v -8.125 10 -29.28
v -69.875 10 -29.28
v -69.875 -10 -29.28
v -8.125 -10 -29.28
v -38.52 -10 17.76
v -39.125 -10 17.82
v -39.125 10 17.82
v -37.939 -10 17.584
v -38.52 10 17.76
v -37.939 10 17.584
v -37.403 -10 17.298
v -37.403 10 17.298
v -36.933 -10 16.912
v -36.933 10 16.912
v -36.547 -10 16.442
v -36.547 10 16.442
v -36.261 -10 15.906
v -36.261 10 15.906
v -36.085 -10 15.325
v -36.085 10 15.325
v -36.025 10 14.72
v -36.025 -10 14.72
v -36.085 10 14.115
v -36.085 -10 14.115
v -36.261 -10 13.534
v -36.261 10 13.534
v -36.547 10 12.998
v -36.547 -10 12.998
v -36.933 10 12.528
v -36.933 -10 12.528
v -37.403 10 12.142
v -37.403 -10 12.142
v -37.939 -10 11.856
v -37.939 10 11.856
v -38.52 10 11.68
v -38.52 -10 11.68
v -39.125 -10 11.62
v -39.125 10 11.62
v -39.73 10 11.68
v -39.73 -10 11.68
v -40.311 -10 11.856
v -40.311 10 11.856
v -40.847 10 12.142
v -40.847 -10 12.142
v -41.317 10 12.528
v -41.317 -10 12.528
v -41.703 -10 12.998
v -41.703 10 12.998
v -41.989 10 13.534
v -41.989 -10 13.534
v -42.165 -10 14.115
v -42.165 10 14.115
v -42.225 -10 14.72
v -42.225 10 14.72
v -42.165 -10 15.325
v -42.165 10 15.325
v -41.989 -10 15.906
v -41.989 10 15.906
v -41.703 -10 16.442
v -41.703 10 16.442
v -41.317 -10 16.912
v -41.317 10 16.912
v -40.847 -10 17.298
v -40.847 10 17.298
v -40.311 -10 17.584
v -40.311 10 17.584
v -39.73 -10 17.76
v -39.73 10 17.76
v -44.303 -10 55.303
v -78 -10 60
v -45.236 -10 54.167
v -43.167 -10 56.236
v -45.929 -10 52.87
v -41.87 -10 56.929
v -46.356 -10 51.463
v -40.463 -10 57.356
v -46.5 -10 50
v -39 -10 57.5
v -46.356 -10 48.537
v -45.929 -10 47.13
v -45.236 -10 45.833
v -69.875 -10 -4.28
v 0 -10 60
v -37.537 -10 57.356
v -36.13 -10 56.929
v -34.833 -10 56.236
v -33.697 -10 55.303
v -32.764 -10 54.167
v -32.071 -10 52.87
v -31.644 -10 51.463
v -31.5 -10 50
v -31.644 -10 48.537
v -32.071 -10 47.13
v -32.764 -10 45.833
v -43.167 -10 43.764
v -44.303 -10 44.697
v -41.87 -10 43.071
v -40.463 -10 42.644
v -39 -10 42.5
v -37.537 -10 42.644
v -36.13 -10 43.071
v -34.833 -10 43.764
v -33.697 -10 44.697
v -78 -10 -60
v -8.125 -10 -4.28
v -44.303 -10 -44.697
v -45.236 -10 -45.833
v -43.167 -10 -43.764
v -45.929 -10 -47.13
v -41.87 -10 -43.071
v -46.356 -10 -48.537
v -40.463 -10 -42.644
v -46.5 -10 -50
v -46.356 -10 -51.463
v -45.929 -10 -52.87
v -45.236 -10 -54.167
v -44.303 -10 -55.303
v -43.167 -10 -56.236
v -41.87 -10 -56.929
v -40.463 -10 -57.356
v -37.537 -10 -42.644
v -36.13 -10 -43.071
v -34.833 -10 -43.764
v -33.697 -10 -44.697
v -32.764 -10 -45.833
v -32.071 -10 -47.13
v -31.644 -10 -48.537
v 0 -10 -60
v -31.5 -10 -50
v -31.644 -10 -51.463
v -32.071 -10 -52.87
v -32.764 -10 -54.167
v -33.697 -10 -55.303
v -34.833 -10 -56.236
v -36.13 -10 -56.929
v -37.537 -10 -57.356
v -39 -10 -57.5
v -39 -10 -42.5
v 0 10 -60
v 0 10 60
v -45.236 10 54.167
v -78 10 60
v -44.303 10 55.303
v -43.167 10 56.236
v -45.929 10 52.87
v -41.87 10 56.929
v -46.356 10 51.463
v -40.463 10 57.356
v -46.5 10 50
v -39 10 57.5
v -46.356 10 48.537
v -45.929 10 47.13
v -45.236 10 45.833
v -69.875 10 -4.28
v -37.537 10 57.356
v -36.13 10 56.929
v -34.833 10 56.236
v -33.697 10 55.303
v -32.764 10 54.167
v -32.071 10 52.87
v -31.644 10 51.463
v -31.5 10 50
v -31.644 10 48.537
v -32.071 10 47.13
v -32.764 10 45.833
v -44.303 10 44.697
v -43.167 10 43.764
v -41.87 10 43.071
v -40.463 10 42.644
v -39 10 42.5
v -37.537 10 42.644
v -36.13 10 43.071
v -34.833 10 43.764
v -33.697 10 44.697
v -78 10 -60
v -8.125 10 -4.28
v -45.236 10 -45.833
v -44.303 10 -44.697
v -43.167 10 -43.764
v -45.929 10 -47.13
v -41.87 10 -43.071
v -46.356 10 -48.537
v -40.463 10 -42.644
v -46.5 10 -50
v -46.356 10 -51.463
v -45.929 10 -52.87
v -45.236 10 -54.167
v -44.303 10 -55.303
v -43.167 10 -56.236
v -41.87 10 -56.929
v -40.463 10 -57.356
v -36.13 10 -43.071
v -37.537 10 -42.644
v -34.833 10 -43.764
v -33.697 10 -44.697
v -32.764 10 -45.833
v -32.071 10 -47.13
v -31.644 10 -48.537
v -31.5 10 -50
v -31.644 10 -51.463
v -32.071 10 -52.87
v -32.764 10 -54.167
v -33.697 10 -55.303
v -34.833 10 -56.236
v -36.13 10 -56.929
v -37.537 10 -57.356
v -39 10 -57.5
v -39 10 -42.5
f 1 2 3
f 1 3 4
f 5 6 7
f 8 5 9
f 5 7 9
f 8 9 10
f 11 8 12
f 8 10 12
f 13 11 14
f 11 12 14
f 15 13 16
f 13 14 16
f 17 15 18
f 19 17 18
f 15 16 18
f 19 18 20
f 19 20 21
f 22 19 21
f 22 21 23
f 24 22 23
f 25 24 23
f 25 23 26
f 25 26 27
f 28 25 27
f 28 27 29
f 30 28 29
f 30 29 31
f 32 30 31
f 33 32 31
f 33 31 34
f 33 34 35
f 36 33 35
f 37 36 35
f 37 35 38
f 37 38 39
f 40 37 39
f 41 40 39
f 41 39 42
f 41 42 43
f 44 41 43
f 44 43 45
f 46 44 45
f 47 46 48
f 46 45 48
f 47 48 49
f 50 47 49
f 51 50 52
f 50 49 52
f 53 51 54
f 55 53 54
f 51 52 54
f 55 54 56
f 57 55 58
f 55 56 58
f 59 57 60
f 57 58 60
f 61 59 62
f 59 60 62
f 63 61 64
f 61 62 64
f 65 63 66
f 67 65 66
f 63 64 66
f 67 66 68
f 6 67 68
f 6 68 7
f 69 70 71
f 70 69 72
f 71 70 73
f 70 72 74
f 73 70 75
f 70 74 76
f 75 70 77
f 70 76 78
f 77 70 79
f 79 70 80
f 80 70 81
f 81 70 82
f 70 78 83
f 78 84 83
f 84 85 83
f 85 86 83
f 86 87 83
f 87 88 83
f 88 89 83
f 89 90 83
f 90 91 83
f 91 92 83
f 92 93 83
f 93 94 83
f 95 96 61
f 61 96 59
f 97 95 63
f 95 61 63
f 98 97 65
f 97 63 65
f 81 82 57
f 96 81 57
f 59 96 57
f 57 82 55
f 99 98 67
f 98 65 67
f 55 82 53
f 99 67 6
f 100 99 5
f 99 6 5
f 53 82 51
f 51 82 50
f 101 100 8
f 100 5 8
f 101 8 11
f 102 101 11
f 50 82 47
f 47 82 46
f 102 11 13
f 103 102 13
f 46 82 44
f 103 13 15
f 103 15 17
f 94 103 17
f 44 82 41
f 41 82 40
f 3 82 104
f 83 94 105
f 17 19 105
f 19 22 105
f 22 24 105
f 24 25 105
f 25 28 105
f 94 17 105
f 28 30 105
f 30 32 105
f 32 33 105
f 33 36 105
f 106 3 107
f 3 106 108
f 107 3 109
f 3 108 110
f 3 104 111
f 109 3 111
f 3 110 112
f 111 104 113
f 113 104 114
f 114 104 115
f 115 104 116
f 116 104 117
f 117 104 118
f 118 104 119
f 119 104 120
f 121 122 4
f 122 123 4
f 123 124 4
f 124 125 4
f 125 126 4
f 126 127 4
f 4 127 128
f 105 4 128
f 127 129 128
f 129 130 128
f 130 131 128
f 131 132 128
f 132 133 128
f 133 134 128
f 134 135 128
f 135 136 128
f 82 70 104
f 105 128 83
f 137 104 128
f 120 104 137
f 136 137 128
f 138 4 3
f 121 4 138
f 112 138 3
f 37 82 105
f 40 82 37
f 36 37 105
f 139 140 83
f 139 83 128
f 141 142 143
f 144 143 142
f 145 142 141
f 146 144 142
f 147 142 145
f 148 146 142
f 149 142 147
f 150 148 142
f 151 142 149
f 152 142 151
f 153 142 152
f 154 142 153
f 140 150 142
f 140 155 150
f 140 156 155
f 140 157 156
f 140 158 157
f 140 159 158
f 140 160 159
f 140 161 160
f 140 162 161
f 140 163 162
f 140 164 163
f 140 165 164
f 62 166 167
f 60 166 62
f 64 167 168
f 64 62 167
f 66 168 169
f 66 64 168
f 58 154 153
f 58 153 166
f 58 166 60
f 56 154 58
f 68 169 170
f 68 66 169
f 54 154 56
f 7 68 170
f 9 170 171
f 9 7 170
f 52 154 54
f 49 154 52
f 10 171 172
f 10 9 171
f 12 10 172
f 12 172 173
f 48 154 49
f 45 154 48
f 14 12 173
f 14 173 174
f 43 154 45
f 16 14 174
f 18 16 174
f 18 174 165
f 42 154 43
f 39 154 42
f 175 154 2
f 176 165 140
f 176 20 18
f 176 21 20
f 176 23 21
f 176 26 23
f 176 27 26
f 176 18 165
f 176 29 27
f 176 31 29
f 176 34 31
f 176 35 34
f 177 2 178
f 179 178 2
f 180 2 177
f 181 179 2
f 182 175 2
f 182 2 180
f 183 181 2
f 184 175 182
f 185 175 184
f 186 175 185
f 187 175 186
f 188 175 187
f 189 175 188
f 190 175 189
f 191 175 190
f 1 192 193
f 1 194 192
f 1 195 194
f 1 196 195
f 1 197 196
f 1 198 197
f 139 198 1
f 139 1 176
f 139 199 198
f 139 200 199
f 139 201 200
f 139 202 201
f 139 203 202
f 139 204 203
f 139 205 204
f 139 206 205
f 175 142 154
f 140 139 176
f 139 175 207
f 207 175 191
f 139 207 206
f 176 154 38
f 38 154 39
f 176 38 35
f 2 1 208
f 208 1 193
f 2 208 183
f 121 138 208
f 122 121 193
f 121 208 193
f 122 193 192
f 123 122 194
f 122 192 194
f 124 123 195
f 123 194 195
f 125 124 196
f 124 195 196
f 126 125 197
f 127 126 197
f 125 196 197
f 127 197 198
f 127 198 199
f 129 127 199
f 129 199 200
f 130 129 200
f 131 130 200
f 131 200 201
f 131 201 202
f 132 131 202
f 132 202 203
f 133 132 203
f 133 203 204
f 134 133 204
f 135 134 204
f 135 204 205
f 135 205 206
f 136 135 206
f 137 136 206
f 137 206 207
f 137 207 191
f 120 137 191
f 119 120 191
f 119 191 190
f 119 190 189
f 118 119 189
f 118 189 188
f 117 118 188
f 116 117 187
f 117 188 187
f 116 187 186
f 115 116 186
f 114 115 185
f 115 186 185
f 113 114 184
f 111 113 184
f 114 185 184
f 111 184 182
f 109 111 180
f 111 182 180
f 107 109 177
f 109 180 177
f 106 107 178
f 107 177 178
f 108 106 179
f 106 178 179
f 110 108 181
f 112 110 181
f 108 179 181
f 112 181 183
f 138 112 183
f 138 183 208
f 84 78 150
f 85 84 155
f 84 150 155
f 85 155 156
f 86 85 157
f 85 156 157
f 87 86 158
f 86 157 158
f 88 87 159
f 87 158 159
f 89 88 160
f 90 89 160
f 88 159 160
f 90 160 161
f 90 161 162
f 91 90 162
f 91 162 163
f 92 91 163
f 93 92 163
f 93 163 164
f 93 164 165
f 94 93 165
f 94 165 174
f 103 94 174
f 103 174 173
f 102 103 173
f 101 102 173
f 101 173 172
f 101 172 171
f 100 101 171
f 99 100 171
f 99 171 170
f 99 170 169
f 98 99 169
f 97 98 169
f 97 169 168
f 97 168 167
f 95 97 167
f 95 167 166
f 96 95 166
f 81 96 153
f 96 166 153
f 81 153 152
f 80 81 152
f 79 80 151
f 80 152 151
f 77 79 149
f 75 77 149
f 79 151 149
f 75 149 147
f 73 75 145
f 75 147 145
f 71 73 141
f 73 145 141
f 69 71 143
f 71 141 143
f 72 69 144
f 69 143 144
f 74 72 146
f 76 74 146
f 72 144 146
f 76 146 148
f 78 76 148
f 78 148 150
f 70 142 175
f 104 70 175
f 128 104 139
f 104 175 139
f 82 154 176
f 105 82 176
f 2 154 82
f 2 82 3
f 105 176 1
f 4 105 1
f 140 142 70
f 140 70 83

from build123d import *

# Parameters (mm, degrees)
SKETCH1_W           = 78
SKETCH1_H           = 120
BOSS_EXTRUDE1_DEPTH = 10
CUT_EXTRUDE1_REACH  = 102.419
SKETCH2_W           = 61.75
SKETCH2_H           = 25
CUT_EXTRUDE2_REACH  = 102.419
SKETCH3_R           = 7.5
CUT_EXTRUDE3_REACH  = 102.419
SKETCH5_R           = 3.1


with BuildPart() as part:
    # Sketch1 → Boss-Extrude1 (new, symmetric)
    with BuildSketch(Plane(origin=(0, 0, 0), x_dir=(1, 0, 0), z_dir=(0, 1, 0))):
        with Locations((-39, 0)):
            Rectangle(SKETCH1_W, SKETCH1_H)
    extrude(amount=BOSS_EXTRUDE1_DEPTH, both=True)

    # Sketch2 → Cut-Extrude1 (cut, up to next)
    with BuildSketch(Plane(origin=(0, 10, 0), x_dir=(1, 0, 0), z_dir=(0, 1, 0)), mode=Mode.PRIVATE) as cut_extrude1_sk1:
        with Locations((-39, 16.78)):
            Rectangle(SKETCH2_W, SKETCH2_H)
    cut_extrude1_tool1 = extrude(cut_extrude1_sk1.sketch, amount=-CUT_EXTRUDE1_REACH, mode=Mode.PRIVATE) & part.part
    add(cut_extrude1_tool1.solids().sort_by_distance((-39, 10, -16.78))[0], mode=Mode.SUBTRACT)

    # Sketch3 → Cut-Extrude2 (cut, up to next)
    with BuildSketch(Plane(origin=(0, 10, 0), x_dir=(1, 0, 0), z_dir=(0, 1, 0)), mode=Mode.PRIVATE) as cut_extrude2_sk1:
        with Locations(Location((-39, 50, 0), (0, 0, 270))):
            Circle(SKETCH3_R)
    cut_extrude2_tool1 = extrude(cut_extrude2_sk1.sketch, amount=-CUT_EXTRUDE2_REACH, mode=Mode.PRIVATE) & part.part
    # Sketch3 → Cut-Extrude2 (cut, up to next)
    with BuildSketch(Plane(origin=(0, 10, 0), x_dir=(1, 0, 0), z_dir=(0, 1, 0)), mode=Mode.PRIVATE) as cut_extrude2_sk2:
        with Locations(Location((-39, -50, 0), (0, 0, 270))):
            Circle(SKETCH3_R)
    cut_extrude2_tool2 = extrude(cut_extrude2_sk2.sketch, amount=-CUT_EXTRUDE2_REACH, mode=Mode.PRIVATE) & part.part
    add(cut_extrude2_tool1.solids().sort_by_distance((-39, 10, -50))[0], mode=Mode.SUBTRACT)
    add(cut_extrude2_tool2.solids().sort_by_distance((-39, 10, 50))[0], mode=Mode.SUBTRACT)

    # Sketch5 → Cut-Extrude3 (cut, up to next)
    with BuildSketch(Plane(origin=(0, 10, 0), x_dir=(1, 0, 0), z_dir=(0, 1, 0)), mode=Mode.PRIVATE) as cut_extrude3_sk1:
        with Locations(Location((-39.125, -14.72, 0), (0, 0, 270))):
            Circle(SKETCH5_R)
    cut_extrude3_tool1 = extrude(cut_extrude3_sk1.sketch, amount=-CUT_EXTRUDE3_REACH, mode=Mode.PRIVATE) & part.part
    add(cut_extrude3_tool1.solids().sort_by_distance((-39.125, 10, 14.72))[0], mode=Mode.SUBTRACT)


solid = part.part
